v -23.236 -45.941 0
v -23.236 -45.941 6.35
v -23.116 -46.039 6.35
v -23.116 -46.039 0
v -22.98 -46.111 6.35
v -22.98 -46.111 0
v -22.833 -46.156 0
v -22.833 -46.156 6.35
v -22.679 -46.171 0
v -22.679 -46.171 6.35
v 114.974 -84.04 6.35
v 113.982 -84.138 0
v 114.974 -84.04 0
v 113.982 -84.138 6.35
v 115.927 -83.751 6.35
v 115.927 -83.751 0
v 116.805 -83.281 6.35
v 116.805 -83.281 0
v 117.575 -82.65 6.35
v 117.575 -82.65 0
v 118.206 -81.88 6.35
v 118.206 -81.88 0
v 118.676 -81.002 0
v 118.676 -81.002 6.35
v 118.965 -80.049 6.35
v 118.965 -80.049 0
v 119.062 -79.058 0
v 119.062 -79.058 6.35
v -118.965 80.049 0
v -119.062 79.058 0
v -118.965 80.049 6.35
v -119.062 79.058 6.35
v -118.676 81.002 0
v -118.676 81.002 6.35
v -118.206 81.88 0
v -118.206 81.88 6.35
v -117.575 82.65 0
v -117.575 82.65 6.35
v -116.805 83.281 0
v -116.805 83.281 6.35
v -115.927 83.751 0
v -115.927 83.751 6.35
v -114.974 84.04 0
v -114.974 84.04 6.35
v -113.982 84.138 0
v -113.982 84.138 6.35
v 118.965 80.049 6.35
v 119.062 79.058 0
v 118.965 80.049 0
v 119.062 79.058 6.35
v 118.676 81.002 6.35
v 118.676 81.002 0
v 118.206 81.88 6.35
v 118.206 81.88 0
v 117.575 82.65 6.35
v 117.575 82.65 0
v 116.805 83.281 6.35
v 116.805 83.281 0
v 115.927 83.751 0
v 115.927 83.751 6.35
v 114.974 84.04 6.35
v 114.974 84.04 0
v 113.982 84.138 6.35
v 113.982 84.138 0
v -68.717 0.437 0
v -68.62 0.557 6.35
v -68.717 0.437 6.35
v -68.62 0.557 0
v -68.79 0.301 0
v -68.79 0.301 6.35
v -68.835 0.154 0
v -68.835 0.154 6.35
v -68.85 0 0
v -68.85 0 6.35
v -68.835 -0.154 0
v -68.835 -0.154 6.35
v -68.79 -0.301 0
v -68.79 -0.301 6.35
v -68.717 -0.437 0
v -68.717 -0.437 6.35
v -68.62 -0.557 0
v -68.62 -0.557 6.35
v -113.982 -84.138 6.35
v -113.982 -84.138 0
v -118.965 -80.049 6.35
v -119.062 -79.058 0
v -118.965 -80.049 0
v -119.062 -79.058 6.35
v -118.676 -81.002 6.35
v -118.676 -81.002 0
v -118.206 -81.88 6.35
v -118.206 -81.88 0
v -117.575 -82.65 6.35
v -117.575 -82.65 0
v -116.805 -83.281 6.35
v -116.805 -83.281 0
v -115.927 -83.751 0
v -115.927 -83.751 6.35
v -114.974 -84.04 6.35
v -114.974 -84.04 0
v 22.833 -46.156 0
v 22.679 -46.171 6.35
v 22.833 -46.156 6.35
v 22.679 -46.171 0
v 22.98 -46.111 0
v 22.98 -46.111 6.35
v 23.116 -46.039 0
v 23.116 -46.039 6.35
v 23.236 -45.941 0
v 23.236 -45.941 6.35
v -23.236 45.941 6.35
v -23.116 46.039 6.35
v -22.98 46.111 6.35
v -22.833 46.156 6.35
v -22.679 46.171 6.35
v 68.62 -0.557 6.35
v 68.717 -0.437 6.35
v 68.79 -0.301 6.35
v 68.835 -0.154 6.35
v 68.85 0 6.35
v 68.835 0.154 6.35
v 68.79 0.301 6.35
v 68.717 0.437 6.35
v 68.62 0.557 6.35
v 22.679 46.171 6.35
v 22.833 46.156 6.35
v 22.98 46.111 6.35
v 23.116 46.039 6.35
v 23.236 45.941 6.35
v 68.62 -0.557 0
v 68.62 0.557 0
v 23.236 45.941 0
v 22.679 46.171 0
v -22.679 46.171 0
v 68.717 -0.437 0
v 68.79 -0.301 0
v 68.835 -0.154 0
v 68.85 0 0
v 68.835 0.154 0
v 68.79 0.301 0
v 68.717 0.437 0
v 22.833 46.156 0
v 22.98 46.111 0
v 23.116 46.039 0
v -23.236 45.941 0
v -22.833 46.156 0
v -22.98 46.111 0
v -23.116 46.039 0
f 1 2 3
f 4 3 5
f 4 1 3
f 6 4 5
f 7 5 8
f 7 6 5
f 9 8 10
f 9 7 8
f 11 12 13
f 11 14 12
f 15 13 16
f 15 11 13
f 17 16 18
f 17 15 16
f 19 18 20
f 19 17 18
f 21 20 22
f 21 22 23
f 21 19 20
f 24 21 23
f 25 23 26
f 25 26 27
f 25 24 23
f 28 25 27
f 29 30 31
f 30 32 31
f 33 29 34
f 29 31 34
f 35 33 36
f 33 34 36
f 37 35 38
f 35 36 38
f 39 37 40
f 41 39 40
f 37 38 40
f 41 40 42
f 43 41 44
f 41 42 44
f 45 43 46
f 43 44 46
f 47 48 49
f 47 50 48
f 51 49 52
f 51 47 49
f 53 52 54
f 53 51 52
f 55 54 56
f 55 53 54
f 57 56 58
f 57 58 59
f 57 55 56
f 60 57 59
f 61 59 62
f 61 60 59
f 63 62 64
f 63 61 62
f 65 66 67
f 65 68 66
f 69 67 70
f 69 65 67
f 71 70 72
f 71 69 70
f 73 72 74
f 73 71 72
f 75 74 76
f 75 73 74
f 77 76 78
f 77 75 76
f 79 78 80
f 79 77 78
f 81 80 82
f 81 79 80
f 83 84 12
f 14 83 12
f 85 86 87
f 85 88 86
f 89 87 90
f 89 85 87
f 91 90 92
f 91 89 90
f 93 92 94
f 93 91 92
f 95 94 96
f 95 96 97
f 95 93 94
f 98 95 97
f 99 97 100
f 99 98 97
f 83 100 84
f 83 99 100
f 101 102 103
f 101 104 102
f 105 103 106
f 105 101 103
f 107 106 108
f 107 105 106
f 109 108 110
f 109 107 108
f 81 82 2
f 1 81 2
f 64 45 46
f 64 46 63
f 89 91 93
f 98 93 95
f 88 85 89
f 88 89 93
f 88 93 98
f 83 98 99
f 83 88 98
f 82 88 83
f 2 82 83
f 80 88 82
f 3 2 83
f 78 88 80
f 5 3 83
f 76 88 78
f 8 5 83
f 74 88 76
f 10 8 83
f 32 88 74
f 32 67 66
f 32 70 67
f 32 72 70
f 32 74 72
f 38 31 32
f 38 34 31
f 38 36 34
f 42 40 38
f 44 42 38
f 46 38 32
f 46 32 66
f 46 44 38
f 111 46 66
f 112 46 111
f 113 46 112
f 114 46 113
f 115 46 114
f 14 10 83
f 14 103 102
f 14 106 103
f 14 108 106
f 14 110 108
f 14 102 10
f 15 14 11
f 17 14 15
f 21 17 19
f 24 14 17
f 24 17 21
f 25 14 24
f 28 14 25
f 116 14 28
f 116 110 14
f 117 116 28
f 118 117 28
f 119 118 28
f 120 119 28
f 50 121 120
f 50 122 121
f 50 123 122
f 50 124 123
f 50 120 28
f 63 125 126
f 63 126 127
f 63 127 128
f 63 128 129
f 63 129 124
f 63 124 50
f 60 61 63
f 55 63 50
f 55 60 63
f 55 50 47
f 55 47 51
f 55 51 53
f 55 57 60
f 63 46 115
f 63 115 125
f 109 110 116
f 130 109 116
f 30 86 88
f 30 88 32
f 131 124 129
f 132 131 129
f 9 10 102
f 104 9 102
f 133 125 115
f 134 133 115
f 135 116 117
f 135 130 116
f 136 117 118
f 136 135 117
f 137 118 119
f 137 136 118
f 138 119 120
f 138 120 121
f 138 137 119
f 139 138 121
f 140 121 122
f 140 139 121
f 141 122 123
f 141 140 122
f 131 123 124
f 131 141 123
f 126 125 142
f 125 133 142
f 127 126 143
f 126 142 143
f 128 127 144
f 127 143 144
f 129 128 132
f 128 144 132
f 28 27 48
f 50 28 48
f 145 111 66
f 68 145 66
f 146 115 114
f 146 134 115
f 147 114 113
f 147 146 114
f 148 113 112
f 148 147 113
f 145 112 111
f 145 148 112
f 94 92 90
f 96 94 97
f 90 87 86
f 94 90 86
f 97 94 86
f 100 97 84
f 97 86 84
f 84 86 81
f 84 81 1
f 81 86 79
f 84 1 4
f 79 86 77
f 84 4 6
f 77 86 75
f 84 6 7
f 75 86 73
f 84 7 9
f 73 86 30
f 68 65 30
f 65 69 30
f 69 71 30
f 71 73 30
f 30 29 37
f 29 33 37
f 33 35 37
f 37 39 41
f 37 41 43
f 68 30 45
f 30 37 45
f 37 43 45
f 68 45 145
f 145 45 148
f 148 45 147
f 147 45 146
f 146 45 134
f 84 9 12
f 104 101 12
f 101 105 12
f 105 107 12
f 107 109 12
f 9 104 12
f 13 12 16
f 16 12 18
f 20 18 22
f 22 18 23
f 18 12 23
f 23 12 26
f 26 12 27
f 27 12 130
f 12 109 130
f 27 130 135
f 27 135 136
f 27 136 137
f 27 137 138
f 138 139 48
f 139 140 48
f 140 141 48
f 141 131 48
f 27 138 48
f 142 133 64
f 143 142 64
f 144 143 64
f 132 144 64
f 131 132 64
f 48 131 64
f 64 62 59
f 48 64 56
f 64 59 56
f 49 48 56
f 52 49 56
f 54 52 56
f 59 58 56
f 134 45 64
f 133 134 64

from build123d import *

# Parameters (mm, degrees)
F0_W     = 238.125
F0_H     = 168.275
F1_DEPTH = 6.35
F2_R     = 5.08
F4_DEPTH = 25.4
F6_DEPTH = 25.4
F7_R     = 0.7874


with BuildPart() as f1:
    # F0 (on Top) → F1 (new body)
    with BuildSketch(Plane.XY):
        Rectangle(F0_W, F0_H)
    extrude(amount=F1_DEPTH)

    # F2
    f2_edges = [f1.edges().sort_by_distance(p)[0] for p in [
        (119.0625, 84.1375, 3.175),
        (119.0625, -84.1375, 3.175),
        (-119.0625, -84.1375, 3.175),
        (-119.0625, 84.1375, 3.175),
    ]]
    fillet(f2_edges, radius=F2_R)

    # F3 (on face) → F4 (cut)
    with BuildSketch(Plane.XY.offset(6.35)):
        Polygon((22.479, 44.901281), (-22.479, 44.901281), (-67.380281, 0), (-22.479, -44.901281), (22.479, -44.901281), (67.380281, 0), align=None)
    extrude(amount=-F4_DEPTH, mode=Mode.SUBTRACT)

    # F5 (on face) → F6 (cut)
    with BuildSketch(Plane.XY.offset(6.35)):
        Polygon((23.005051, 46.171281), (-23.005051, 46.171281), (-69.176332, 0), (-23.005051, -46.171281), (23.005051, -46.171281), (69.176332, 0), align=None)
    extrude(amount=-F6_DEPTH, mode=Mode.SUBTRACT)

    # F7
    f7_edges = [f1.edges().sort_by_distance(p)[0] for p in [
        (-23.005051, 46.171281, 3.175),
        (23.005051, 46.171281, 3.175),
        (-69.176332, 0, 3.175),
        (-23.005051, -46.171281, 3.175),
        (23.005051, -46.171281, 3.175),
        (69.176332, 0, 3.175),
    ]]
    fillet(f7_edges, radius=F7_R)


solid = f1.part
